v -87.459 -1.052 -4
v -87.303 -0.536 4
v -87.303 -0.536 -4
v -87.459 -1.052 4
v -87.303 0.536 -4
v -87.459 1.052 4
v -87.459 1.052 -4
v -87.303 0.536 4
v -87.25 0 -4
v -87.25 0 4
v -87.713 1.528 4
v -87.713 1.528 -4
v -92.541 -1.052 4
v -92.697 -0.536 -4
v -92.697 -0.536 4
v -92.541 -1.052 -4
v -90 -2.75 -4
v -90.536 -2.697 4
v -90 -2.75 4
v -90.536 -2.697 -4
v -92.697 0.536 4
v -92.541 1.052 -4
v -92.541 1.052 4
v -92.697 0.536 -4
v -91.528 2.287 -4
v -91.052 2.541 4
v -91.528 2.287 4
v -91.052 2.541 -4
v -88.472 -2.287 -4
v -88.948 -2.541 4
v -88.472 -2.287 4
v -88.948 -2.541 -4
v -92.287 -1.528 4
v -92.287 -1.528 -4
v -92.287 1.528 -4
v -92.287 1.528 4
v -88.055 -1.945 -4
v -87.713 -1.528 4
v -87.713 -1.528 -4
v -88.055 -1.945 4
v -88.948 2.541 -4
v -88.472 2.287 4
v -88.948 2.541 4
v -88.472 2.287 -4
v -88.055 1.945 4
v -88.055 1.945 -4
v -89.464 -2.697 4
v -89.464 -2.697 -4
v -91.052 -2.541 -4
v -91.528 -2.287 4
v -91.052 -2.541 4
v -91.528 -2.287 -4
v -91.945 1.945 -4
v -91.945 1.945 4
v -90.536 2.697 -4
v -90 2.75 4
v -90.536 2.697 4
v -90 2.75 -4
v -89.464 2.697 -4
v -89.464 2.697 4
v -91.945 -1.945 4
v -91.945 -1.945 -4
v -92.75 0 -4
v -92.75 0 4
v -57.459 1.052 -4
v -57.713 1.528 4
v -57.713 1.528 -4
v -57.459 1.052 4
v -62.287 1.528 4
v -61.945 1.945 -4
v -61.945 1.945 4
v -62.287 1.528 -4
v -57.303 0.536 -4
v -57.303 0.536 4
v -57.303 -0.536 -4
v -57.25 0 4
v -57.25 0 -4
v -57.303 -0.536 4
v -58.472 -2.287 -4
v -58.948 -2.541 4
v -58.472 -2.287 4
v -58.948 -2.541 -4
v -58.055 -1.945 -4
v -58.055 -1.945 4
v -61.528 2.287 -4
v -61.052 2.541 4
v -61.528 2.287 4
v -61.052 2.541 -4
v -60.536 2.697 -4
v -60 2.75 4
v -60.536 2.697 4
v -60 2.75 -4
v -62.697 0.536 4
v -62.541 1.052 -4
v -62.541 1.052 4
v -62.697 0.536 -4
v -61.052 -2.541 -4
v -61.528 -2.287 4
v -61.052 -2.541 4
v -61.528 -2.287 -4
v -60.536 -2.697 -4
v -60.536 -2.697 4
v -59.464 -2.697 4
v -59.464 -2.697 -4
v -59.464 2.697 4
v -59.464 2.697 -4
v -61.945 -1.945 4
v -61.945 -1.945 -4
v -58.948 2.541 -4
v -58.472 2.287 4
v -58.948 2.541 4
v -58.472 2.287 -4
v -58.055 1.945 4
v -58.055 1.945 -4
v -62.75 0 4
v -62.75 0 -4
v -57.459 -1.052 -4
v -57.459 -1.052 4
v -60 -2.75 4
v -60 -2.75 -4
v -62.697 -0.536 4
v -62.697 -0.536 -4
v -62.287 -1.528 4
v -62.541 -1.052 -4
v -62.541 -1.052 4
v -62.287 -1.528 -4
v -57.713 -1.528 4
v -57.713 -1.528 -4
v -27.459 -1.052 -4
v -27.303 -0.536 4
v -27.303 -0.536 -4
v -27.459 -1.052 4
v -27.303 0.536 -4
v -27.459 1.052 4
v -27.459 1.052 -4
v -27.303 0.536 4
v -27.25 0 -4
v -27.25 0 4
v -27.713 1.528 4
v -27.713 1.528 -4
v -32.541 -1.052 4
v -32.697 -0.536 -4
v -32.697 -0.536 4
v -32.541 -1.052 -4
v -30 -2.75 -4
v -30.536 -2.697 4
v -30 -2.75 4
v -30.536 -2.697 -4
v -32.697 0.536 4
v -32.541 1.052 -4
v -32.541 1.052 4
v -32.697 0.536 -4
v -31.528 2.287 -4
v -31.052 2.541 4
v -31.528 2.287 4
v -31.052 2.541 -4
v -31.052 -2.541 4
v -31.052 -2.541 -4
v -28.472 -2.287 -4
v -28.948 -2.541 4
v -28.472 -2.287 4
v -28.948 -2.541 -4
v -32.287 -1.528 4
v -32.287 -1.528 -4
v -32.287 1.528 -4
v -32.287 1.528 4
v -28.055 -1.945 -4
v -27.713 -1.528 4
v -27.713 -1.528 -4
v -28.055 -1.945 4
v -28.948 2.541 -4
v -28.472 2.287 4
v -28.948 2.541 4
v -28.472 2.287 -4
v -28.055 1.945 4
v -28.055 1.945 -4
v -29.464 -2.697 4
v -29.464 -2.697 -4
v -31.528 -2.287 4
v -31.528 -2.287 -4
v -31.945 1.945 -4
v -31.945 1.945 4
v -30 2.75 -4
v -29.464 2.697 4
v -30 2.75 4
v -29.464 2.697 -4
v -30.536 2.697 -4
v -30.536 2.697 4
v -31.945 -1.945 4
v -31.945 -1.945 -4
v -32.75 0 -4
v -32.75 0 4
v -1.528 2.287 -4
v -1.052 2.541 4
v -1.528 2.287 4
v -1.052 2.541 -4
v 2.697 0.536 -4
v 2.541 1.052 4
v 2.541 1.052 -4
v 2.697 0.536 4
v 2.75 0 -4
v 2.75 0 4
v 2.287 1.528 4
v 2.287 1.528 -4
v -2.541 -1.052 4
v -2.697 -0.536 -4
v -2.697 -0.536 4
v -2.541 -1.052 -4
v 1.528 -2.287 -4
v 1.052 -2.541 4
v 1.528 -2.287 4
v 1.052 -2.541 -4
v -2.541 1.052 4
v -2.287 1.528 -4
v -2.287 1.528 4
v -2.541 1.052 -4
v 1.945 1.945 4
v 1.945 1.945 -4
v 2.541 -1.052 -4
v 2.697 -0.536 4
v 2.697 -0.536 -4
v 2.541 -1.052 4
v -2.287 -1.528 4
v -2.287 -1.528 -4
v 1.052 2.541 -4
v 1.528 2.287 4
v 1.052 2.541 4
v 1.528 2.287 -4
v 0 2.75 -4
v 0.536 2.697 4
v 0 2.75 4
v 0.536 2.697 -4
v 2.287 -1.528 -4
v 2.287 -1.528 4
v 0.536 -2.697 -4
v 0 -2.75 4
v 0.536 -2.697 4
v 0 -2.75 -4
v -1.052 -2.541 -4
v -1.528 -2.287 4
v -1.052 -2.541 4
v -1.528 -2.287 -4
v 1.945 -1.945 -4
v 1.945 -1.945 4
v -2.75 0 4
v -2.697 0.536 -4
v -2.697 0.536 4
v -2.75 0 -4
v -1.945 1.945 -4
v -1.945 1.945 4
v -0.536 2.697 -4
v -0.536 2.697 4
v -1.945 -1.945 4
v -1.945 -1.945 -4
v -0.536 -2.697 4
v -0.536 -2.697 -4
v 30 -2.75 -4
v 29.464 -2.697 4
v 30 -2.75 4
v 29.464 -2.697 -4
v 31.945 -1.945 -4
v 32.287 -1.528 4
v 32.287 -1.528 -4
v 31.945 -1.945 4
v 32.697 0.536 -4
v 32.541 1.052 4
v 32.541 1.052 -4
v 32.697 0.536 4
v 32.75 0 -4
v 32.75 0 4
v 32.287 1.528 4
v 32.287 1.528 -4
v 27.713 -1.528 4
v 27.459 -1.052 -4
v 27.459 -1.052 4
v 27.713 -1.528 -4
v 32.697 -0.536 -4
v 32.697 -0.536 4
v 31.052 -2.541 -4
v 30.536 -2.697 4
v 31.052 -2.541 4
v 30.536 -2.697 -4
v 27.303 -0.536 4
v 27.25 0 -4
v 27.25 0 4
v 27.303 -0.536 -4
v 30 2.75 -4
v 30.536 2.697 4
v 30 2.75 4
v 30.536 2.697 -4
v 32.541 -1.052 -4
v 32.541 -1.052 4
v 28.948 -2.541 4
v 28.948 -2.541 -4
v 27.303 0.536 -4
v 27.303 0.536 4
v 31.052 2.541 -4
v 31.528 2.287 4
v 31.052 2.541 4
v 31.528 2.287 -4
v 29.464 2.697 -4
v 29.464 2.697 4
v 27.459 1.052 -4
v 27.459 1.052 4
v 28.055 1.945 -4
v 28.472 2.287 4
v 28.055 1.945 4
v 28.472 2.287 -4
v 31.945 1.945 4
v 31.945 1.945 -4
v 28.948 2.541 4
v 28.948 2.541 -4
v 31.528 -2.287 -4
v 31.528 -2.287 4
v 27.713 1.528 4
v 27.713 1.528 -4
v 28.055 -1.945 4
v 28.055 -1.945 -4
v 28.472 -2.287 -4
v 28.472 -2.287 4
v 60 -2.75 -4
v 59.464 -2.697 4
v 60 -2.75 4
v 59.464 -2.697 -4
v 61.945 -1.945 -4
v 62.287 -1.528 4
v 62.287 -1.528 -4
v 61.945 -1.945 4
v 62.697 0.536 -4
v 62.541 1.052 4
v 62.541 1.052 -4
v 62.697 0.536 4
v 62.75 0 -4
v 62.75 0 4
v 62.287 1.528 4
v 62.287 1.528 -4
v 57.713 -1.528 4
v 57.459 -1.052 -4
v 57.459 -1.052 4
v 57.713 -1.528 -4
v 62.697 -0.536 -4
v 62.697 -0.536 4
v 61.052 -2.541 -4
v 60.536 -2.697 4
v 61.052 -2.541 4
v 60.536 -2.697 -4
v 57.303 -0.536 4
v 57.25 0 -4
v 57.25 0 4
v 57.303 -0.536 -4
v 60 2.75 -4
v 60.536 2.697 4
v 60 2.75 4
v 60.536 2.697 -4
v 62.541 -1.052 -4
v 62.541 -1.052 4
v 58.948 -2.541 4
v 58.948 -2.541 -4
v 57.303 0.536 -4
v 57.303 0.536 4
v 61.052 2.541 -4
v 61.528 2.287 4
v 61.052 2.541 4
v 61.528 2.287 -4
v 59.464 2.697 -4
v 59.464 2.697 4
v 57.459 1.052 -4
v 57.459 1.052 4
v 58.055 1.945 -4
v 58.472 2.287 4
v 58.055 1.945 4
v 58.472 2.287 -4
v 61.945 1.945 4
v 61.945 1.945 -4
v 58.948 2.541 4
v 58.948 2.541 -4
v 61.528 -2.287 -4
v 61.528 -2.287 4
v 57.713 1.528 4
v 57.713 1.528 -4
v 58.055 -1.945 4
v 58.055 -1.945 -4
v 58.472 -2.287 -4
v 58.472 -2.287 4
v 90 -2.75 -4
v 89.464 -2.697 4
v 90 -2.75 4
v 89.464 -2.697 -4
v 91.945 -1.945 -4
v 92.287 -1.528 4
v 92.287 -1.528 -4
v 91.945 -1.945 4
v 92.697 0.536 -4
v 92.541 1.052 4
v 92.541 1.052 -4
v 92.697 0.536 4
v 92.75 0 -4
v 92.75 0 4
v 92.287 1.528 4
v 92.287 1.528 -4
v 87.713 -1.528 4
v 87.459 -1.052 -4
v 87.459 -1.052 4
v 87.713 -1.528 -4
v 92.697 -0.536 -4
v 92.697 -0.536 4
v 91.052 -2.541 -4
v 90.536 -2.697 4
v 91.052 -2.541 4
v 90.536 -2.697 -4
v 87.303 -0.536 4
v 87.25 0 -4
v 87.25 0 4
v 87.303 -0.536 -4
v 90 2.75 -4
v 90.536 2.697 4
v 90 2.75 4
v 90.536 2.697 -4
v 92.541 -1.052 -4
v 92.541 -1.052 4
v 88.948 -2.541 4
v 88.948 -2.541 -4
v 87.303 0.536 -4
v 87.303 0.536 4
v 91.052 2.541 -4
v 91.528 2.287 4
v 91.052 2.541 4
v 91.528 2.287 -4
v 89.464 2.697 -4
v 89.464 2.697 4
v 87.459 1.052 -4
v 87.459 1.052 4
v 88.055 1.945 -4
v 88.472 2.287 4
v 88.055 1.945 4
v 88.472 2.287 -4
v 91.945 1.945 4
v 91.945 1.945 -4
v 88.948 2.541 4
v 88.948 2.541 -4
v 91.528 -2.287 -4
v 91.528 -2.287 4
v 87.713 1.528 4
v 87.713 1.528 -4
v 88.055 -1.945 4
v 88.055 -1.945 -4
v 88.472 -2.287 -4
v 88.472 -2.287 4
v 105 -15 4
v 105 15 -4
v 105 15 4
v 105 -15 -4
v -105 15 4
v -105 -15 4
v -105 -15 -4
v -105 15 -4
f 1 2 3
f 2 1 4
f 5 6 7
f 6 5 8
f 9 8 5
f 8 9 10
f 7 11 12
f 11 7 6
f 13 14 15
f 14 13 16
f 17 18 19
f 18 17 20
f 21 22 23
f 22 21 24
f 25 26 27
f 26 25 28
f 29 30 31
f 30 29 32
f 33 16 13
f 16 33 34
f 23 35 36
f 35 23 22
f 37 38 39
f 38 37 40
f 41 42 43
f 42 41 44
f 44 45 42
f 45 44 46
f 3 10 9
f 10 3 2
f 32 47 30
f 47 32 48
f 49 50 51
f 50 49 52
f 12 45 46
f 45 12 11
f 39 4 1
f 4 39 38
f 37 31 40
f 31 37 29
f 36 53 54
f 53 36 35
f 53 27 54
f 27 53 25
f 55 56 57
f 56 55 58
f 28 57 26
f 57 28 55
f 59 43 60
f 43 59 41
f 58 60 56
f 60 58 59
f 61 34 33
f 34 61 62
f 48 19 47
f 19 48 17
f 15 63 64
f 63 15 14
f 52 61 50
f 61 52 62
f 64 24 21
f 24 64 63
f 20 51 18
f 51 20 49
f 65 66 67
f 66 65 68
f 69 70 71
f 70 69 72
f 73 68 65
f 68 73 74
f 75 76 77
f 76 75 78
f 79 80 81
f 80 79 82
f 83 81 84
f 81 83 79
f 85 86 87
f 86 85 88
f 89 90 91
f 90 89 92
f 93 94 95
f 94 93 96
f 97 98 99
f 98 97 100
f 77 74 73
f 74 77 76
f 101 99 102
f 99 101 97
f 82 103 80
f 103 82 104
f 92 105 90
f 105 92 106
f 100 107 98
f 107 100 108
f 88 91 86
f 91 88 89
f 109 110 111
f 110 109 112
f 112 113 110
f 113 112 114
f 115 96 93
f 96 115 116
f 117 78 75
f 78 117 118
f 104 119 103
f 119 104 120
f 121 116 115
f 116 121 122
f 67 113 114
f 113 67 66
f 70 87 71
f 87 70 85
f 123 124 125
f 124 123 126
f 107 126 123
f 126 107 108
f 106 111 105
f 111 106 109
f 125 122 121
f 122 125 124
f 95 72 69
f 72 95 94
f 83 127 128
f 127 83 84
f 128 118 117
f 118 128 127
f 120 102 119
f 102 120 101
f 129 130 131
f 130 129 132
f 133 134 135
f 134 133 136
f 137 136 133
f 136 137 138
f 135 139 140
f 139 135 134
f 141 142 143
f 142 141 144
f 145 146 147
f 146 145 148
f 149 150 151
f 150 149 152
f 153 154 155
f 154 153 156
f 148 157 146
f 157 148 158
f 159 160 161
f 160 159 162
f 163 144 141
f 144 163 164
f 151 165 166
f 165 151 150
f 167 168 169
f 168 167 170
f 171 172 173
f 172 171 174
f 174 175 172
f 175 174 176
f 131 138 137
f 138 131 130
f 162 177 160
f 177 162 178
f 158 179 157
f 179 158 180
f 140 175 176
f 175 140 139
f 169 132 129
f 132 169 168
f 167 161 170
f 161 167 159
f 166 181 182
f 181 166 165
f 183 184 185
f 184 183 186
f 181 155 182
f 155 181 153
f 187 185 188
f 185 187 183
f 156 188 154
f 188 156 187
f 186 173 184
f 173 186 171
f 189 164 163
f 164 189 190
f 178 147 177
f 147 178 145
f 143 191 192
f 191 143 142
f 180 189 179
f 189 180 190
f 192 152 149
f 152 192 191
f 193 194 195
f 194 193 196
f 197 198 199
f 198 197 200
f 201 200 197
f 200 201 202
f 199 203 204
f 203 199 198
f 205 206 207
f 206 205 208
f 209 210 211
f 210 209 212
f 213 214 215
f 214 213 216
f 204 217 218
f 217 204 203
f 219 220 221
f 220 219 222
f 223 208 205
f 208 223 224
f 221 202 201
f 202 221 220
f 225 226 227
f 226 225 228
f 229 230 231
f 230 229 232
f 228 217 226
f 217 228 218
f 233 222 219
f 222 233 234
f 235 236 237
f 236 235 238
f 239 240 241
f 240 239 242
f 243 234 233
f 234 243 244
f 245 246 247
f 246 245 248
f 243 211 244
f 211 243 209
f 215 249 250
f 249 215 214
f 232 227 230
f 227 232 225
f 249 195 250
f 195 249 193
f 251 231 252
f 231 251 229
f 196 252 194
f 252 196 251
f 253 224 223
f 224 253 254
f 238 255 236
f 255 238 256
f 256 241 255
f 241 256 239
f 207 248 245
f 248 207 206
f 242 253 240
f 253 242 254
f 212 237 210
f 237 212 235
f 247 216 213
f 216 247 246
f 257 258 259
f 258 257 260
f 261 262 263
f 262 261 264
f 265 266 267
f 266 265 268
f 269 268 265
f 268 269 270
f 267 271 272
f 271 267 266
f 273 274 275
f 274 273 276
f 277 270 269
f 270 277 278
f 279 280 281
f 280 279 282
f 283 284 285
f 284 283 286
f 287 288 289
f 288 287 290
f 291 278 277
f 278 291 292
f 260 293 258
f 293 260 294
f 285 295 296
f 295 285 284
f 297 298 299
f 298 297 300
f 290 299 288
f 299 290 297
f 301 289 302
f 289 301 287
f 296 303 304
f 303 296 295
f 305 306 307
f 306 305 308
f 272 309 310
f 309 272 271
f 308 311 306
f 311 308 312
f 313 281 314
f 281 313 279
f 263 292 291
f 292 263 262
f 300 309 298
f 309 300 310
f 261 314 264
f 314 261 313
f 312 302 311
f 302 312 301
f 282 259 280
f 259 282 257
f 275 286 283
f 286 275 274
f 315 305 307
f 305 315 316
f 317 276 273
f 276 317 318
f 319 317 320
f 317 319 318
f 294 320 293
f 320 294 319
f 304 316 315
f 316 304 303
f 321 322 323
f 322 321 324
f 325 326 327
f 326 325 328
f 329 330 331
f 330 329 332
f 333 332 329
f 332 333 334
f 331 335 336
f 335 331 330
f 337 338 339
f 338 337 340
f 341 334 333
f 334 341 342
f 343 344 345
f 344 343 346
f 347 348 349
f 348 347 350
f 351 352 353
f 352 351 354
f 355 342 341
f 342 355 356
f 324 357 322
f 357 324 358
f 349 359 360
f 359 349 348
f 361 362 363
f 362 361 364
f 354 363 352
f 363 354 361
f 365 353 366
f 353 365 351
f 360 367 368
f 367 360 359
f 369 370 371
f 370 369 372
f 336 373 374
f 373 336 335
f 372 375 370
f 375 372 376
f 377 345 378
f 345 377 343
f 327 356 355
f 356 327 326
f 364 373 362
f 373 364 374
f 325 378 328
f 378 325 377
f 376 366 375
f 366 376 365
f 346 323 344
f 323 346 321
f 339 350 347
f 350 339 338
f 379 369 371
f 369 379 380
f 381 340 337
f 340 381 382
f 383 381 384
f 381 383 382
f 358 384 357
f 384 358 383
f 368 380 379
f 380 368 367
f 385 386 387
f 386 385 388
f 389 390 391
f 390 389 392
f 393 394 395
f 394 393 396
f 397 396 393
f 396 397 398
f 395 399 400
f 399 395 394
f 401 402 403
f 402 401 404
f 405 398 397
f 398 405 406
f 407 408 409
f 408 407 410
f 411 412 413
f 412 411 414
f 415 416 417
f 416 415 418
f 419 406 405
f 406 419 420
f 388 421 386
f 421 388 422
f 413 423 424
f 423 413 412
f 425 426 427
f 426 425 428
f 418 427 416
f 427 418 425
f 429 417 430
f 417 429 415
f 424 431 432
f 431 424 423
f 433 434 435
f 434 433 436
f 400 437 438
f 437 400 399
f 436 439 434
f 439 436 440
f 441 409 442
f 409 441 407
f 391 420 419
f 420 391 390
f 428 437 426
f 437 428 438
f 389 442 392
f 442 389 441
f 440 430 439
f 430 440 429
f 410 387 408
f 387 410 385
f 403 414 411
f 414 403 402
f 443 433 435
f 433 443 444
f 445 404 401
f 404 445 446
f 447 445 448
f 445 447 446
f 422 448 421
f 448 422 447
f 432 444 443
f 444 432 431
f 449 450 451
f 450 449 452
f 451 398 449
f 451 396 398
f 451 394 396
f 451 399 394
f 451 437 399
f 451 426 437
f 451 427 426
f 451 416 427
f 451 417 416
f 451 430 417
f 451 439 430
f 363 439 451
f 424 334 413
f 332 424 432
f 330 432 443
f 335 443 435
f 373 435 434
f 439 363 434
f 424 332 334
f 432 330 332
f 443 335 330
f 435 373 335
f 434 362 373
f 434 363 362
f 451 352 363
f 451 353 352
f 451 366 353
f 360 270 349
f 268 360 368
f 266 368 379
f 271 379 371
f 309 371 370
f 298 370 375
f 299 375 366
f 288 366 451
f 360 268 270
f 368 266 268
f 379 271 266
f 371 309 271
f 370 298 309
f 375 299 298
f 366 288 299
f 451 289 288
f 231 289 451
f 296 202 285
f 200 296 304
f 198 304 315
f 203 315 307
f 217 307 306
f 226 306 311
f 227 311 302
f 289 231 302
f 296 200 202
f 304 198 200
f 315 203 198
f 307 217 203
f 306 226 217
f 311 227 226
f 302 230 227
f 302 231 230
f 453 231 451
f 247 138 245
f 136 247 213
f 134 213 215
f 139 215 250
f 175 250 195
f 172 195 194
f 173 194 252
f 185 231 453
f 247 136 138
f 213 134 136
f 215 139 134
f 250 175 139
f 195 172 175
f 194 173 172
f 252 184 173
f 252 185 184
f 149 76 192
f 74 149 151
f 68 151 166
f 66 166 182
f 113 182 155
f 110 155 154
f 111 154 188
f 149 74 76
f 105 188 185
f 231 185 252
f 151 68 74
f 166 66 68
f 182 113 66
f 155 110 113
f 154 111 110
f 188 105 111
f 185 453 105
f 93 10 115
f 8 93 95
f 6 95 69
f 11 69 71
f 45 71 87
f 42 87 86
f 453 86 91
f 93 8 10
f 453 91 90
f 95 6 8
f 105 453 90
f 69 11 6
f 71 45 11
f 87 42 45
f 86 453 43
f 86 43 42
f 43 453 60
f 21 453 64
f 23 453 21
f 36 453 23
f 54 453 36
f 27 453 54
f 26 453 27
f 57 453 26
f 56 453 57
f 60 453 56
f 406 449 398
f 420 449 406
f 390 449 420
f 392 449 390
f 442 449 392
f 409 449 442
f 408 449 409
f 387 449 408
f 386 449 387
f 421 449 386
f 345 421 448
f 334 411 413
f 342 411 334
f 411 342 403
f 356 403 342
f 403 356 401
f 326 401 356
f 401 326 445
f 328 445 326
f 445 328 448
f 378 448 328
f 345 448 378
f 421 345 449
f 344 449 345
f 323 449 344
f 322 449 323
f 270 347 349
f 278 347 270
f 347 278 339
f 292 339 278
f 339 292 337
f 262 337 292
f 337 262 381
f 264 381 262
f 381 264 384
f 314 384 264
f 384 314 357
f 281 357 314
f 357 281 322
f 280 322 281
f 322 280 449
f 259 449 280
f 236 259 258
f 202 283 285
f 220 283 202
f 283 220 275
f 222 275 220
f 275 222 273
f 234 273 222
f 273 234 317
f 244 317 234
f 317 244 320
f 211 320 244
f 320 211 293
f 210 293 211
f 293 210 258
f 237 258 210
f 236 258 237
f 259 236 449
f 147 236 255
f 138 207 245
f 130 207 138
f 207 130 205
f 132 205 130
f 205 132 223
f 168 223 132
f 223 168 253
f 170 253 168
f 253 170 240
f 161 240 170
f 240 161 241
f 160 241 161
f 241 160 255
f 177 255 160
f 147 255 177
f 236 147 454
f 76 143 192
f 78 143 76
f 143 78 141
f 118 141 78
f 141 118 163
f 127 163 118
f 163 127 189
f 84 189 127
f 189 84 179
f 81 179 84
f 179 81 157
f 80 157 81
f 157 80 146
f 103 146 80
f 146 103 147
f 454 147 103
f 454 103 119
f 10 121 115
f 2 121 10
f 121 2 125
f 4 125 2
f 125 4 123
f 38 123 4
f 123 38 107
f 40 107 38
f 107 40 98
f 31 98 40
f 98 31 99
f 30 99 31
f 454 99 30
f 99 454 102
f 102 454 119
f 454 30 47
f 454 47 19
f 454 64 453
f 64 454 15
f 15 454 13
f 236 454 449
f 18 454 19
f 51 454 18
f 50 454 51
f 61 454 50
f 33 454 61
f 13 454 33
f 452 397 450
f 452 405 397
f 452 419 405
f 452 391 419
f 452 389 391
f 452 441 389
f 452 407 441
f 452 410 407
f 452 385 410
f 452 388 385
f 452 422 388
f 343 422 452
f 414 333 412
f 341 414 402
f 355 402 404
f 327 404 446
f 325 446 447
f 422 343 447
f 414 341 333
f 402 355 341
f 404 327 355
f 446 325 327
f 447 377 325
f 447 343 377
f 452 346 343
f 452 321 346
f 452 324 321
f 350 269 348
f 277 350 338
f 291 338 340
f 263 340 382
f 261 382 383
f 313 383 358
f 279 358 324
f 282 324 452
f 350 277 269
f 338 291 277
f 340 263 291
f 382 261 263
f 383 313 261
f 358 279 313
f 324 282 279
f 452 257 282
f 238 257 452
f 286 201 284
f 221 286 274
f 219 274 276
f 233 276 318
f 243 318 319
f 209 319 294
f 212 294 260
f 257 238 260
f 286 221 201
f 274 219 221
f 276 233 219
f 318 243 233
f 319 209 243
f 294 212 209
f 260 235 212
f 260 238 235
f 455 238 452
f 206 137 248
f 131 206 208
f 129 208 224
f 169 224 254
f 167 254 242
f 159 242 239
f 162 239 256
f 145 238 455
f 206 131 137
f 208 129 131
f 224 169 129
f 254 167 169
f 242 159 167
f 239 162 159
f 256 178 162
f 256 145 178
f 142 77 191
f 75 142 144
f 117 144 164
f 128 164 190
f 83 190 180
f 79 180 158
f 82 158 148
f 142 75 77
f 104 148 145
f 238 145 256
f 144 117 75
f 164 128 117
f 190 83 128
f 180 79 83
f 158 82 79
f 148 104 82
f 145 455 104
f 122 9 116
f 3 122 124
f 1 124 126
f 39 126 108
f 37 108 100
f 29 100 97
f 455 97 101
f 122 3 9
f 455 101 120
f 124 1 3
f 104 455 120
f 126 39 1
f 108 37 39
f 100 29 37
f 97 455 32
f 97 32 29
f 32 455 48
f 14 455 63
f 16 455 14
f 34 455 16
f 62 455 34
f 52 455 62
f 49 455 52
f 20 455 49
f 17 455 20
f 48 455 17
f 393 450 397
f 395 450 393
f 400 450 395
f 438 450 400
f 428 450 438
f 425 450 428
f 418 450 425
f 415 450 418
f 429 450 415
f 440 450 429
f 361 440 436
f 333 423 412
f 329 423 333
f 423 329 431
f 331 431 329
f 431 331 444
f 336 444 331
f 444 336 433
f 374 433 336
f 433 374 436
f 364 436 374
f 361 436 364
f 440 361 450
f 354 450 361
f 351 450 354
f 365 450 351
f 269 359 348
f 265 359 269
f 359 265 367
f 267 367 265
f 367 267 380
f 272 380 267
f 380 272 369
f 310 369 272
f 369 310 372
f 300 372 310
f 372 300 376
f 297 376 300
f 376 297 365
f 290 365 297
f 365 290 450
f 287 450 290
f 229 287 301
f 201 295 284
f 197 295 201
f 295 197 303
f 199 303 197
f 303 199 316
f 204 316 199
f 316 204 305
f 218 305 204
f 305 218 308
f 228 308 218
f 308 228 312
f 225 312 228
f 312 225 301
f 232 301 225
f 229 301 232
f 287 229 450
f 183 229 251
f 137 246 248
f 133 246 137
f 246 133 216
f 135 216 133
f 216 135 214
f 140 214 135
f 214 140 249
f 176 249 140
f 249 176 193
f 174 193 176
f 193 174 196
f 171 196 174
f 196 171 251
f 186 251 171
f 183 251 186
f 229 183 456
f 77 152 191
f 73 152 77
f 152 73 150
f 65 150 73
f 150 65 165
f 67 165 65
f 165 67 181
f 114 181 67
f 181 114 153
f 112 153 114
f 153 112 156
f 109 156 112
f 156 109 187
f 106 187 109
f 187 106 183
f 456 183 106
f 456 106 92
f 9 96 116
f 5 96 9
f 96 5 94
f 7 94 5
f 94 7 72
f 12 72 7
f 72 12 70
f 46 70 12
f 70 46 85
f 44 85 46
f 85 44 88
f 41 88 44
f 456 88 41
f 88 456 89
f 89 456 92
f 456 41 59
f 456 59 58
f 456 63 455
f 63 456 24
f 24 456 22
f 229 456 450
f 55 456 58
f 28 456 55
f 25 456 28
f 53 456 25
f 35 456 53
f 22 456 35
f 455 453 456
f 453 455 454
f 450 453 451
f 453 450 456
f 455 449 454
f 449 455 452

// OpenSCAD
$fn = 32;

// ----------------------------------------------------------------------
// Hole bar, 7 x Ø5.5
// row layout, 15 mm edge offset
// ----------------------------------------------------------------------

// --- parameters (mm) ---
bar_w = 30;    // bar width (Y)
bar_t = 8;     // bar thickness (Z)
holes = 7;     // holes per row
hole_d = 5.5;  // hole diameter
edge = 15;     // offset from the bar end to the first hole
pitch = 30;    // pitch between neighbouring holes

// --- derived feature positions (mm) ---
span = (holes - 1) * pitch;   // = 180   distance between the end holes
bar_l = span + 2 * edge;      // = 210   overall bar length
start_x = -bar_l / 2 + edge;  // = -90   X of the first hole
feature_centers = [
  [start_x + 0 * pitch, 0],
  [start_x + 1 * pitch, 0],
  [start_x + 2 * pitch, 0],
  [start_x + 3 * pitch, 0],
  [start_x + 4 * pitch, 0],
  [start_x + 5 * pitch, 0],
  [start_x + 6 * pitch, 0]
];   // hole centres of the first row

// bar with one row of holes, drilled from feature_centers
difference() {
  translate([-bar_l / 2, -bar_w / 2, -bar_t / 2]) cube([bar_l, bar_w, bar_t]);
  for (centre = feature_centers)
    translate([centre[0], centre[1], 0])
      cylinder(d = hole_d, h = bar_t + 2, center = true);
}
